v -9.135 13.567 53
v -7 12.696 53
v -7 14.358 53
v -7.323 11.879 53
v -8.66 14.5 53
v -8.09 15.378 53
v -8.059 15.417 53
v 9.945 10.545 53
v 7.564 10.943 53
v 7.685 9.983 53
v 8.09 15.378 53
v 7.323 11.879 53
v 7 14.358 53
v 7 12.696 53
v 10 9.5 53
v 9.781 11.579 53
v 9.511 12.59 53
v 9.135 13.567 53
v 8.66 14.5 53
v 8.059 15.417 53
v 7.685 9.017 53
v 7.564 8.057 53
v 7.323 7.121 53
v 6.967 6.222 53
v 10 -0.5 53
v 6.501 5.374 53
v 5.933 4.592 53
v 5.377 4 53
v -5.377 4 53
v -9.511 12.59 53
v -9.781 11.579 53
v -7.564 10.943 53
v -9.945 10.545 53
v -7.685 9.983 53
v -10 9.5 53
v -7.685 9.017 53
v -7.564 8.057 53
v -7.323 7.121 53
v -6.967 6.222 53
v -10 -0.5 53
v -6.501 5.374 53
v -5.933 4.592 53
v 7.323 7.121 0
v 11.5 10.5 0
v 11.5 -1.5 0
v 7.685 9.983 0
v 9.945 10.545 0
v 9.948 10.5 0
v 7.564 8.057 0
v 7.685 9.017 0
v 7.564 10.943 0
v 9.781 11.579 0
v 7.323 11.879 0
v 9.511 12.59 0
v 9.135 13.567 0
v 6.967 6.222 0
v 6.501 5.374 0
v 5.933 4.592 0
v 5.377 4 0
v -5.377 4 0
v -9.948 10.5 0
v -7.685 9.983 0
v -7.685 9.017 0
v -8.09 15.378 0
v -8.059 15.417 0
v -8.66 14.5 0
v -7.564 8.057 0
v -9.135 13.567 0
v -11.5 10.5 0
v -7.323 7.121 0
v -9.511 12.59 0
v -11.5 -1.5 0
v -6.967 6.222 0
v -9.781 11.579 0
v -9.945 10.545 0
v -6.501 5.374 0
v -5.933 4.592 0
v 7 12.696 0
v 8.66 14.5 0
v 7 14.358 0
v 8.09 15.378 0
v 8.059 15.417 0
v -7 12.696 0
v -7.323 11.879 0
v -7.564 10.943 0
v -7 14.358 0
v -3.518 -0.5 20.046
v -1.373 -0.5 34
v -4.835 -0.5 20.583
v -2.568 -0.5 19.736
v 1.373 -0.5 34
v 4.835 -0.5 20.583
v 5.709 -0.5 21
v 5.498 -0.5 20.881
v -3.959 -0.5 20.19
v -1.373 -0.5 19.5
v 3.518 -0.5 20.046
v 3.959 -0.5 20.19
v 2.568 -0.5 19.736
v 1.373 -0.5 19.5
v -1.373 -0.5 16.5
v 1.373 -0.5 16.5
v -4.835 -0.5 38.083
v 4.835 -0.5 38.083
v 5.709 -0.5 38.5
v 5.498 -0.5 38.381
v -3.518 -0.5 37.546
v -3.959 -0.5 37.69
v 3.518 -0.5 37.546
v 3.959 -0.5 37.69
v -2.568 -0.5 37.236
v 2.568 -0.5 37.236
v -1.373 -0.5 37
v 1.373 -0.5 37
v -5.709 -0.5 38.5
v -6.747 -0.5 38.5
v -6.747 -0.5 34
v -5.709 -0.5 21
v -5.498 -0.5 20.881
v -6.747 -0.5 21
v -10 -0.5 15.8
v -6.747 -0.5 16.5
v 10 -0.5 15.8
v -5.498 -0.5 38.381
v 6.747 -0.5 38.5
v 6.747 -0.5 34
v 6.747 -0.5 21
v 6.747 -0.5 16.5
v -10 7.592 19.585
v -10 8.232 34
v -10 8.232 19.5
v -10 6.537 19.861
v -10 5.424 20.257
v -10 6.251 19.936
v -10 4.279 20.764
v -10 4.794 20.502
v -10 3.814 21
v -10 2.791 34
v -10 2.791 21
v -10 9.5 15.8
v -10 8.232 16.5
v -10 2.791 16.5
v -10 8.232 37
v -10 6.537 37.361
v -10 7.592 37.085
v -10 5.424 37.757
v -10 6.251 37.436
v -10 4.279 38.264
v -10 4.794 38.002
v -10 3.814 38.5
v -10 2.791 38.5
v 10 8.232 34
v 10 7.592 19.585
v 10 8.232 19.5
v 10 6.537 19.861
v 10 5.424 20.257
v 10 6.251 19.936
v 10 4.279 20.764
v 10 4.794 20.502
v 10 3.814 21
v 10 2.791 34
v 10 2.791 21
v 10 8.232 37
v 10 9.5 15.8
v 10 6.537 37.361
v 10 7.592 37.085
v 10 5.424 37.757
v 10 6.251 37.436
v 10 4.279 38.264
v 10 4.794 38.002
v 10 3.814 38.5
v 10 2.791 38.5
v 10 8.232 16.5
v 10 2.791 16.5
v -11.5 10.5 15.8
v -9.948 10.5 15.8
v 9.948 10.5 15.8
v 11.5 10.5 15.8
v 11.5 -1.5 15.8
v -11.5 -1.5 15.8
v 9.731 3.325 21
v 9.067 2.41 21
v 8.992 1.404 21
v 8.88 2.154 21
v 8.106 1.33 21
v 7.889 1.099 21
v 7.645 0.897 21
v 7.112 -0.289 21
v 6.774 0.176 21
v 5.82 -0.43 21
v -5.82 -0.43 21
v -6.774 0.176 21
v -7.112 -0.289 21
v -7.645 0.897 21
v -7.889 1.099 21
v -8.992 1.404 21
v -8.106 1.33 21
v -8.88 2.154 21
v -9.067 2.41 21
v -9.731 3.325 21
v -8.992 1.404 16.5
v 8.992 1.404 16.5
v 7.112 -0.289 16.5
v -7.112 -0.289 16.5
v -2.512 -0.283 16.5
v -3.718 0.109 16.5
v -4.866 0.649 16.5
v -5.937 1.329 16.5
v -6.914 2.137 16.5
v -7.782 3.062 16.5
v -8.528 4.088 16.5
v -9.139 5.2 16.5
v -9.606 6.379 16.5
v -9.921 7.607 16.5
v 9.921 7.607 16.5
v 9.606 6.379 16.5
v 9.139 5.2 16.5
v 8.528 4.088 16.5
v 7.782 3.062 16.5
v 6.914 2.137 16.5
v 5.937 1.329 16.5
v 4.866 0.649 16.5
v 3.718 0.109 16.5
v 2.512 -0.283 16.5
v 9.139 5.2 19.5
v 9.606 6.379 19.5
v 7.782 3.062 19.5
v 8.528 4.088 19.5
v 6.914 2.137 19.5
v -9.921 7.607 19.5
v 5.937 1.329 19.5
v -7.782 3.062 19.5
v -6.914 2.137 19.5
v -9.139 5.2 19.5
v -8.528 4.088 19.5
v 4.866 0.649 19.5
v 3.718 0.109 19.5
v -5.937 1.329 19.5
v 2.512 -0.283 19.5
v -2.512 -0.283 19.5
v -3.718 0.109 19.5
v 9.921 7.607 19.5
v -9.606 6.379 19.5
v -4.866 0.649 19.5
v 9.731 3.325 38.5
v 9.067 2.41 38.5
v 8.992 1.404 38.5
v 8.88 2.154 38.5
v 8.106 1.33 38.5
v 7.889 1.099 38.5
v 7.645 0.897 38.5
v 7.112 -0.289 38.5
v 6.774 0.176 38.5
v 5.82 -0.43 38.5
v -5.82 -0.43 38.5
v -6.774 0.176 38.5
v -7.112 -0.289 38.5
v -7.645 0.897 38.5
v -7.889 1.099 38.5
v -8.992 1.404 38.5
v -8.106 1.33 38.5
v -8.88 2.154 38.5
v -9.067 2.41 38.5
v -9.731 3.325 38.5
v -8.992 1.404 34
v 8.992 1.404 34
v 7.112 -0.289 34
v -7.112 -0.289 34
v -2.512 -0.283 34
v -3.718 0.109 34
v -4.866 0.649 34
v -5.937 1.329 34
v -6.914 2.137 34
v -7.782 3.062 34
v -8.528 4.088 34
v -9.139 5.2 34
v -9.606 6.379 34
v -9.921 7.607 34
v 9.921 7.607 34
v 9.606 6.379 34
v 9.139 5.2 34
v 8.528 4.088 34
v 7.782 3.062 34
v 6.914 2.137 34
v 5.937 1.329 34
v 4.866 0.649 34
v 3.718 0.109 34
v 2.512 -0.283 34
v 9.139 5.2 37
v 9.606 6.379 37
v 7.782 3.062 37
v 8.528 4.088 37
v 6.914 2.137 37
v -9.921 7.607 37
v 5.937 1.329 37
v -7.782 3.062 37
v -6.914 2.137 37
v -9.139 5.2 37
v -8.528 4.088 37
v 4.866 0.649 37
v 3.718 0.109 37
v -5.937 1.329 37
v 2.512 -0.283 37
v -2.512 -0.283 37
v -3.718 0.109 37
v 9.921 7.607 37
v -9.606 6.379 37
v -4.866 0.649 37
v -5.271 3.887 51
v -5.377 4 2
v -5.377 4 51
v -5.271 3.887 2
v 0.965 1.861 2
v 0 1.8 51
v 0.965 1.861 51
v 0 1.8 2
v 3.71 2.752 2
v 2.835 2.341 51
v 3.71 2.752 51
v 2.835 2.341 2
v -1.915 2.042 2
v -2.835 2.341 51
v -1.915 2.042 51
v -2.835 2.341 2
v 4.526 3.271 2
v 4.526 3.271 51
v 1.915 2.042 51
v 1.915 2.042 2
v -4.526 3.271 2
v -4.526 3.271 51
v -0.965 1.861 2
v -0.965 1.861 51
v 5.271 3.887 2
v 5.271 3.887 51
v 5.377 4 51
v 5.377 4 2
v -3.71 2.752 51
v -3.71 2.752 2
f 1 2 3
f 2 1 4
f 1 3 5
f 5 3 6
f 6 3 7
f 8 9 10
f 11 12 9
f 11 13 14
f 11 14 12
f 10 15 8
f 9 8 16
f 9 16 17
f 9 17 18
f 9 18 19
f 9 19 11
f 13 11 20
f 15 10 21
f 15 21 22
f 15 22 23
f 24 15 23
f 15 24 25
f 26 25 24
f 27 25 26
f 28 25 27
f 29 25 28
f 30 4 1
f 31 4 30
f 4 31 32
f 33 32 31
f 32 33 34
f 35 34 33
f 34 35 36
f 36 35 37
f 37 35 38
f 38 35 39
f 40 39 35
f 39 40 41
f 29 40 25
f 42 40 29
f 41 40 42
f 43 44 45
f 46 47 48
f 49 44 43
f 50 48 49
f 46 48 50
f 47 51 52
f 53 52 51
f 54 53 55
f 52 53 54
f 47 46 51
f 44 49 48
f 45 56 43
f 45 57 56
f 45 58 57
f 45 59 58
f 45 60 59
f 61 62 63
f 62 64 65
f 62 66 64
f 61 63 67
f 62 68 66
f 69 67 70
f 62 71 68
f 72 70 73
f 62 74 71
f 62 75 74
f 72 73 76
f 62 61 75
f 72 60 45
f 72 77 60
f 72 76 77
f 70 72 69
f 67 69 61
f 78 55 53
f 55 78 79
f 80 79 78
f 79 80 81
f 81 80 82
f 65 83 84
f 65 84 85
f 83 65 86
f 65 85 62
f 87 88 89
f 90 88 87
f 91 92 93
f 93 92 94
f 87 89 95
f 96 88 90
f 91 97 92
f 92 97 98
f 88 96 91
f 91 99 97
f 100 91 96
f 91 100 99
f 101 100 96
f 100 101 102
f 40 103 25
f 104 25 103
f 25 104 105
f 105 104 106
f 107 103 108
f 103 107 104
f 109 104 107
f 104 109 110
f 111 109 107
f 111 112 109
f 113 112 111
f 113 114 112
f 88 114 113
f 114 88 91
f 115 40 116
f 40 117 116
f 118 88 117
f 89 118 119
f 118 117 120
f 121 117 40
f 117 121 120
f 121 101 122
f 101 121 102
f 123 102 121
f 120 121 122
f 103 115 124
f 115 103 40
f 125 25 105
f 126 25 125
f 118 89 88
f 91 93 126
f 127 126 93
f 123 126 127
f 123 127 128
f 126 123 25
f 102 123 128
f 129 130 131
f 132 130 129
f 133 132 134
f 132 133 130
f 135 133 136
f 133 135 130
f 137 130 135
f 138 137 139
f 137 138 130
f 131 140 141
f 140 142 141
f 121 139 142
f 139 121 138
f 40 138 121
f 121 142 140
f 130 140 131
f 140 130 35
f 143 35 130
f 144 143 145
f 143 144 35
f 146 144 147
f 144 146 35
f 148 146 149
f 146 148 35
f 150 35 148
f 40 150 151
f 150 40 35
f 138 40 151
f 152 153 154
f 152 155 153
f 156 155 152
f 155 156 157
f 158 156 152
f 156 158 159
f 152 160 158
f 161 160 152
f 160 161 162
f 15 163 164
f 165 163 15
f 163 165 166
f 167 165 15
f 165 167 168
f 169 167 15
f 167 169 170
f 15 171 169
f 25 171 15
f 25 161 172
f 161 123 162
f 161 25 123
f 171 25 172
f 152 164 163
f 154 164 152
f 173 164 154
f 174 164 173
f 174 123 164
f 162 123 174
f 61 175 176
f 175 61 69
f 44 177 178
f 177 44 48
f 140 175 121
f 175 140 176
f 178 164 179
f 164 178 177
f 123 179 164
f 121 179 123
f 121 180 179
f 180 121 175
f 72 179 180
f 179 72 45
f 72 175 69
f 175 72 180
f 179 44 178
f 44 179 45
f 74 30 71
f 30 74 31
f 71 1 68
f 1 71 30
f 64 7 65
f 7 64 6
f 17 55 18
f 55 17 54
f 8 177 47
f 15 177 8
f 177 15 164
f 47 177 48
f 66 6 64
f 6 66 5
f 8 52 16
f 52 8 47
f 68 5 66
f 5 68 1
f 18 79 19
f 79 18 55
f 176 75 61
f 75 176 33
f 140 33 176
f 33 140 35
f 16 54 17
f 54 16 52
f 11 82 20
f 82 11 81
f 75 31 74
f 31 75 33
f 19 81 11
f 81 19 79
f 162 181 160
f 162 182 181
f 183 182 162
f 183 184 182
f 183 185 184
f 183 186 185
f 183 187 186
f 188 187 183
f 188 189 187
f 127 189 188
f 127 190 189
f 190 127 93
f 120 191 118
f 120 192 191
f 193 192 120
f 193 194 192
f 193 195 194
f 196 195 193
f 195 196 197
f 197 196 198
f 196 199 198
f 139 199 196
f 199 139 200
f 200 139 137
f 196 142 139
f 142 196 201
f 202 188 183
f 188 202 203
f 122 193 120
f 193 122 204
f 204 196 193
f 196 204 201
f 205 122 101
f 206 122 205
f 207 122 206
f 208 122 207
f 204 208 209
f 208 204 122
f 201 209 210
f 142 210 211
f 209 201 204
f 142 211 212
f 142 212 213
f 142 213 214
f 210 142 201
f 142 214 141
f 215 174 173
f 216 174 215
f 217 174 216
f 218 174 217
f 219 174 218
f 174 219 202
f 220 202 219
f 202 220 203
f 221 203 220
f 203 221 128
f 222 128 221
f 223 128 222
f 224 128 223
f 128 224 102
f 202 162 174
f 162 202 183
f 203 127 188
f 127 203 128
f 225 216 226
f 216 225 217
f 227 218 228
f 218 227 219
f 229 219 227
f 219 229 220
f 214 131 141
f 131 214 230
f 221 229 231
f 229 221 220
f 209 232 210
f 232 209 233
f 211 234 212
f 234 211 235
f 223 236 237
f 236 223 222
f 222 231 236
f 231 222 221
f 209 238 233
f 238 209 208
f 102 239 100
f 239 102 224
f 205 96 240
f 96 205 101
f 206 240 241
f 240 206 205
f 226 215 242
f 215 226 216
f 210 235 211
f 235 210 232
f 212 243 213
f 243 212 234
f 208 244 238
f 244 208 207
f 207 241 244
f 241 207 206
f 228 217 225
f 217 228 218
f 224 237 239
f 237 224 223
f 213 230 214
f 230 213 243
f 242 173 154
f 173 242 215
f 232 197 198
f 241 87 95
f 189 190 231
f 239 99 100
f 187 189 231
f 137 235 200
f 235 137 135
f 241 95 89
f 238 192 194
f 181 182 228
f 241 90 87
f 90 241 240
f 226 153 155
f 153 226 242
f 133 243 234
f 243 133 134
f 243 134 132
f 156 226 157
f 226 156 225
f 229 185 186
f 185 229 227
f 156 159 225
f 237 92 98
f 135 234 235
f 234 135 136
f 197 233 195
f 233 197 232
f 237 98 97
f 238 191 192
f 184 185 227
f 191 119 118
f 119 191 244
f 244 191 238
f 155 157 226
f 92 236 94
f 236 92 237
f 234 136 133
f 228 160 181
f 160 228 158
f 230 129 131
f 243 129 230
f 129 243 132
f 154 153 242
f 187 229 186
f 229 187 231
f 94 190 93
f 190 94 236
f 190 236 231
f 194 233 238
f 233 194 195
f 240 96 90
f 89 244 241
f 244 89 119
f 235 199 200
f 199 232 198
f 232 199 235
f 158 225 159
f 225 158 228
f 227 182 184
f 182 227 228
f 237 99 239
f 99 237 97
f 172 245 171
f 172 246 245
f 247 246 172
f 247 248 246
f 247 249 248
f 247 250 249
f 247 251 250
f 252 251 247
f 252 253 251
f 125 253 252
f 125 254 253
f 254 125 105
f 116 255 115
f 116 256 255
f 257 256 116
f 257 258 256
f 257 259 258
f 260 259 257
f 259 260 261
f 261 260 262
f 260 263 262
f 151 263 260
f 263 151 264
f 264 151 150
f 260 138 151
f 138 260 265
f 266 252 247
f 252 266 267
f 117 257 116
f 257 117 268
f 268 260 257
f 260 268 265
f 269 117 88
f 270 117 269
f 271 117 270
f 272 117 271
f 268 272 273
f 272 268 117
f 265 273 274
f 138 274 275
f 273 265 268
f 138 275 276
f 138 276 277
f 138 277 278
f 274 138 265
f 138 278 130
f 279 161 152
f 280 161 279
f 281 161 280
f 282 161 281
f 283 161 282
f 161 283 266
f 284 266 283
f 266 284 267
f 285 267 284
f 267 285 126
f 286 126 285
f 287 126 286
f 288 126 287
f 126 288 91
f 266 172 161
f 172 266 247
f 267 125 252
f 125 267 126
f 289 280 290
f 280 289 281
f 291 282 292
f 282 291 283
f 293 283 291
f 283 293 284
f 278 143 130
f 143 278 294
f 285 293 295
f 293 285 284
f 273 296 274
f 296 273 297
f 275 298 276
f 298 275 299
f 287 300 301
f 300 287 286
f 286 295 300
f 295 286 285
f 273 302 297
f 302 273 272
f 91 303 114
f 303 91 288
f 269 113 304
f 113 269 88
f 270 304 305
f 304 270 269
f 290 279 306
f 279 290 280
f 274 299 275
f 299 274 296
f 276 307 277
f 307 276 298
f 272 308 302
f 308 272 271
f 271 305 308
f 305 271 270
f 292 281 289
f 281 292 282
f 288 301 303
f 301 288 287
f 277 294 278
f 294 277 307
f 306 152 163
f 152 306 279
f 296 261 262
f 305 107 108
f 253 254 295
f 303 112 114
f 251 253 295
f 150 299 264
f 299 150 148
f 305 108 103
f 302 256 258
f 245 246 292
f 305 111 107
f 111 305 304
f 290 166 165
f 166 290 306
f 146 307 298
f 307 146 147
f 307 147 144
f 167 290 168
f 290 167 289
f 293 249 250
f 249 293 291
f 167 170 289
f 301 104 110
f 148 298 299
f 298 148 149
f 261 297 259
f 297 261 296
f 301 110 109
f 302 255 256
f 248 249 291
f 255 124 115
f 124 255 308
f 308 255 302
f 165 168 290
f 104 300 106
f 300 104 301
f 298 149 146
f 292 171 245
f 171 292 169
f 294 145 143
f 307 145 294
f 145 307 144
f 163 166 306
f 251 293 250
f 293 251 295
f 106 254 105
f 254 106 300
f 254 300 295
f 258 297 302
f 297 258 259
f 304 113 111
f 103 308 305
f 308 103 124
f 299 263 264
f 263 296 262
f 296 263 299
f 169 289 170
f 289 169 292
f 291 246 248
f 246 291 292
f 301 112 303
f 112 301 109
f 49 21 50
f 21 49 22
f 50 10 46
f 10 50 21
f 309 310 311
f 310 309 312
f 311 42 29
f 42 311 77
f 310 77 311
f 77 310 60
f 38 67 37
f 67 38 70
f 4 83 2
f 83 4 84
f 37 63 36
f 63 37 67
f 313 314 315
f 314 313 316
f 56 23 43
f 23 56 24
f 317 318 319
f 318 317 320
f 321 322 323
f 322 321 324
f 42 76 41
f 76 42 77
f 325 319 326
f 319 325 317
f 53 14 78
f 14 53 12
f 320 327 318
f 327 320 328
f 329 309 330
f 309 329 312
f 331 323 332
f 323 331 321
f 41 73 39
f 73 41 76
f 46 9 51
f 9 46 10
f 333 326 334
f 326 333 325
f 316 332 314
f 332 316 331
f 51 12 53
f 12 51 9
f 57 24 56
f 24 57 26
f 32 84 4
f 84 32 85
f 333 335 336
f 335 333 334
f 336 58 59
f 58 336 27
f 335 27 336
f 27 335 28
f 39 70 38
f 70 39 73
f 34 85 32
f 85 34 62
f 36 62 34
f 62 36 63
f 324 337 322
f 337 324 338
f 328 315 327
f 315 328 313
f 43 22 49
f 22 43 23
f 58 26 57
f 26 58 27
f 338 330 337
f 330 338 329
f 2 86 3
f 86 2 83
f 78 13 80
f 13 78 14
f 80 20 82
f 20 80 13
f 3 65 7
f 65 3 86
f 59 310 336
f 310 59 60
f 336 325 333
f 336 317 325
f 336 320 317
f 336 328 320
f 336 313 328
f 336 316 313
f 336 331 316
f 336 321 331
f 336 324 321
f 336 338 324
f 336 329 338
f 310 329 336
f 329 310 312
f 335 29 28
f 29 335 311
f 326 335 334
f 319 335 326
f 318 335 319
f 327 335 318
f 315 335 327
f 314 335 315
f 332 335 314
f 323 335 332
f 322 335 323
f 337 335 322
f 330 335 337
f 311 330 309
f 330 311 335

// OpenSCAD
// file: functions.scad
// PRUSA Mendel  
// Functions used in many files
// GNU GPL v2
// Josef Průša
// josefprusa@me.com
// prusadjs.cz
// http://www.reprap.org/wiki/Prusa_Mendel
// http://github.com/prusajr/PrusaMendel

module nut( d, h, horizontal = true )
{
	cornerdiameter = ( d / 2 ) / cos( 180 / 6 );
	cylinder( h = h, r = cornerdiameter, $fn = 6 );
	if( horizontal )
	{
		for( i = [1 : 6] )
		{
			rotate( [0, 0, 60 * i] ) translate( [-cornerdiameter - 0.2, 0, 0] ) rotate( [0, 0, -45] ) cube( size = [2, 2, h] );
		}
	}
}

// By nophead
module polyhole( d, h ) 
{
	n = max( round( 2 * d ), 3 );
	rotate( [0, 0, 180] ) cylinder( h = h, r = ( d / 2 ) / cos( 180 / n ), $fn = n );
}

module roundcorner( diameter )
{
	difference()
	{
		cube( size = [diameter, diameter, 99], center = false );
		translate( v = [diameter, diameter, 0] ) cylinder( h = 100, r = diameter, center = true );
	}
}
// file: metric.scad
// PRUSA Mendel  
// Default metric sizes
// GNU GPL v2
// Josef Průša
// josefprusa@me.com
// prusadjs.cz
// http://www.reprap.org/wiki/Prusa_Mendel
// http://github.com/prusajr/PrusaMendel

// DONT CHANGE THIS FILE! ALTER VALUES IN CONFIGURATION.SCAD INSTEAD

// RODS

threaded_rod_diameter = 8.2;
threaded_rod_diameter_horizontal = 8.2;
smooth_bar_diameter = 8;
smooth_bar_diameter_horizontal = 8.5;

// Nuts and bolts

m8_diameter = 9;
m8_nut_diameter = 16.4;

m4_diameter = 4.5;
m4_nut_diameter = 9;

m3_diameter = 3.6;
m3_nut_diameter = 6.1;

// Bushing holder

bushing_core_diameter = smooth_bar_diameter;
bushing_material_thickness = 1;

// Motors

motor_shaft = 5.5;
// file: configuration.scad
// PRUSA Mendel  
// Configuration file
// GNU GPL v2
// Josef Průša
// josefprusa@me.com
// prusadjs.cz
// http://www.reprap.org/wiki/Prusa_Mendel
// http://github.com/prusajr/PrusaMendel

// PLEASE SELECT ONE OF THE CONFIGURATIONS BELOW
// BY UN-COMMENTING IT

// Uncomment for metric settings
// METRIC METRIC METRIC METRIC METRIC METRIC METRIC METRIC 

include <metric.scad>;

// Uncomment for imperial settings
// IMPERIAL IMPERIAL IMPERIAL IMPERIAL IMPERIAL IMPERIAL IMPERIAL 

//include <sae.scad>;

// CUSTOM CUSTOM CUSTOM CUSTOM CUSTOM CUSTOM CUSTOM CUSTOM CUSTOM

// Thin walls
layer_height = 0.3;
wot = 1.5;
filament_width = layer_height * wot;

thin_wall = 4 * layer_height * wot;

// LM8UU
linear = true;
linear_bearing_diameter = 15;
linear_bearing_length = 24;

//608 bearing
bearing_diameter = 22;
bearing_thickness = 7;

//Timing belt
belt_pitch = 5;

// CHANGE ONLY THE STUFF YOU KNOW
// IT WILL REPLACE DEFAULT SETTING

// RODS

// threaded_rod_diameter = 0;
// threaded_rod_diameter_horizontal = 0;
// smooth_bar_díameter = 0;
// smooth_bar_díameter_horizontal = 0;

// Nuts and bolts

// m8_diameter = 0;
// m8_nut_diameter = 0;
// m8_nut_thickness = 0;

// m4_diameter = 0;
 m4_nut_diameter = 8.5;
// m4_nut_thickness = 0;

// m3_diameter = 0;
// m3_nut_diameter = 0;
m3_nut_thickness = 3;

// Bushing holder

// bushing_core_diameter = smooth_bar_díameter;
// bushing_material_thickness = 0;

///counted stuff
m3_nut_diameter_bigger = ( ( m3_nut_diameter  / 2) / cos( 180 / 6 ) ) * 2;

// functions 
include <functions.scad>
// main file
// PRUSA Mendel  
// Bushings
// GNU GPL v2
// Josef Průša
// josefprusa@me.com
// prusadjs.cz
// http://www.reprap.org/wiki/Prusa_Mendel
// http://github.com/prusajr/PrusaMendel

include <configuration.scad>

/**
 * @id bushing
 * @name Bushing
 * @category Printed
 * @id bushing
 */ 

z_linear_bearings( luu_version = true );
//ziptie();

luu_height = 48;
uu_height = 24;

module z_linear_bearings( luu=false , override_height = -1 )
{
	translate( v = [0, 9.5, 0]) rotate( a = [0, 0, 90] )
	assign( height = ( override_height > 0 ) ? override_height : luu_version ? luu_height + 4 + 1 : 65 )
	{
	
		difference()
		{
			union()
			{
				//main block
				translate( [-5, 0, height / 2] ) cube( [10, 20, height], center = true );
				
				//holder for main block in x-end
				translate( [-5, 0, 15.8 / 2] ) cube( [12, 23, 15.8], center = true );
				translate( [0, 0, 0]) cylinder( h = height, r = 10, $fn = 60 );
			}

			//main axis
			translate( [0, 0, -2] ) cylinder( h = height + 5, r = 7.7, $fn = 50 );

			//main cut
			translate( [10, 0, height / 2] ) cube( [20, 14, height + 5], center = true);

			//smooth entry cut
			translate( [12, 0, height / 2] ) rotate( [0, 0, 45] ) cube( [20, 20, height + 5], center = true );
			translate( [0, 0, 14.5 + 2] ) ziptie();
			translate( [0, 0, height - ( 12 + 2 ) - 5] ) ziptie();
		}
	
		if ( luu_version )
		{
			translate( [-(10 - 5.5) / 2 - 5.5, 0, 0 + 1] ) cube( [10 - 5.5, 20, 2], center = true);
			translate( [-(10 - 5.5) / 2 - 5.5, 0, luu_height + 1 + 2 + 1] ) cube( [10 - 5.5, 20, 2], center = true);
		}
		else
		{
		translate( [-(10 - 5.5) / 2 - 5.5, 0, 0 + 1] ) cube( [10 - 5.5, 20, 2], center = true);
		translate( [-(10 - 5.5) / 2 - 5.5, 0, uu_height + 1 + 2 + 1] ) cube( [10 - 5.5, 20, 2], center = true);
	
		translate( [-(10 - 5.5) / 2 - 5.5, 0, 65 - 1] ) cube( [10 - 5.5, 20, 2], center = true);
		translate( [-(10 - 5.5) / 2 - 5.5, 0, 65 - uu_height - 1 - 2 - 1] ) cube( [10 - 5.5, 20, 2], center = true);
		}
	}
}

module ziptie()
{
	difference()
	{
		translate( v = [0, 0, 0] ) cylinder( h = 4.5, r = 12.1 );
		translate( v = [0, 0, -1] ) cylinder( h = 5, r = 10.1, $fn = 50 );
		translate( v = [0, 0, 3] ) cylinder( h = 2, r1 = 10.1, r2 = 12, $fn = 50 );
	}
}
